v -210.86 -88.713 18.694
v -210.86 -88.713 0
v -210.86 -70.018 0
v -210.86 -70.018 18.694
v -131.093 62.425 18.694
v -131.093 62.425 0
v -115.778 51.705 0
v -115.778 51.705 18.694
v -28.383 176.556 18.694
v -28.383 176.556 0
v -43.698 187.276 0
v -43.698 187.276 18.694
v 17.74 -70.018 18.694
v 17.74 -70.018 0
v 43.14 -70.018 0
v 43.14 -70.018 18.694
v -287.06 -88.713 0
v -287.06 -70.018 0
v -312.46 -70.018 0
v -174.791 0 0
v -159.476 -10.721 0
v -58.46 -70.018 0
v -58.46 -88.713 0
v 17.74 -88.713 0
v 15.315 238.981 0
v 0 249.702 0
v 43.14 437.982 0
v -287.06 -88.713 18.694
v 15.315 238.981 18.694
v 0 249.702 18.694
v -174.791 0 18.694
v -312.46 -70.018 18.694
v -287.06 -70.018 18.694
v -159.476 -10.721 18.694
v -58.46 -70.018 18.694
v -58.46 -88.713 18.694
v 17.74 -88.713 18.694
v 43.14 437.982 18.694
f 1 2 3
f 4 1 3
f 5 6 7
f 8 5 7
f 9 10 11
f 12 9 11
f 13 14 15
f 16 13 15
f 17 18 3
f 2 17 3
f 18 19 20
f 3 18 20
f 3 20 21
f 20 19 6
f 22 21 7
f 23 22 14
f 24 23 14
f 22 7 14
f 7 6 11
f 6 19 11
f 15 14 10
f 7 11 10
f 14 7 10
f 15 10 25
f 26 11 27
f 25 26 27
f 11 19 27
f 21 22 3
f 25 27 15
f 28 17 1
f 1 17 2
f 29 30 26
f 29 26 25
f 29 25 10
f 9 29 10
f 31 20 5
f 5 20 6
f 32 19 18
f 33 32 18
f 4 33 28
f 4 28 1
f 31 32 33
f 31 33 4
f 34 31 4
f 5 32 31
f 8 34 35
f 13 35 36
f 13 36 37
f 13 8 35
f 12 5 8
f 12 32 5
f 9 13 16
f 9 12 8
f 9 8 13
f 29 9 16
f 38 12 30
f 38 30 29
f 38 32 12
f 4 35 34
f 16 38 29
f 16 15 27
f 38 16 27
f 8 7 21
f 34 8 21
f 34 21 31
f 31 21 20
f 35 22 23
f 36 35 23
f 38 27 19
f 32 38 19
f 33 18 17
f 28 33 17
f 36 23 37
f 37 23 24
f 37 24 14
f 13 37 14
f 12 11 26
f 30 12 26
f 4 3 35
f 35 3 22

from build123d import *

# Parameters (mm, degrees)
F1_DEPTH = 18.6944


with BuildPart() as f1:
    # F0 (on Top) → F1 (new body)
    with BuildSketch(Plane.XY):
        Polygon((43.140249, 437.981573), (-312.459751, -70.018427), (-287.059751, -70.018427), (-287.059751, -88.712827), (-210.859751, -88.712827), (-210.859751, -70.018427), (-58.459751, -70.018427), (-58.459751, -88.712827), (17.740249, -88.712827), (17.740249, -70.018427), (43.140249, -70.018427), align=None)
        Polygon((-159.476273, -10.720534), (-174.791323, 0), (-131.093492, 62.425472), (-115.778443, 51.704938), align=None, mode=Mode.SUBTRACT)
        Polygon((0, 249.701889), (15.315049, 238.981355), (-28.382781, 176.555883), (-43.697831, 187.276417), align=None, mode=Mode.SUBTRACT)
    extrude(amount=F1_DEPTH)


solid = f1.part
